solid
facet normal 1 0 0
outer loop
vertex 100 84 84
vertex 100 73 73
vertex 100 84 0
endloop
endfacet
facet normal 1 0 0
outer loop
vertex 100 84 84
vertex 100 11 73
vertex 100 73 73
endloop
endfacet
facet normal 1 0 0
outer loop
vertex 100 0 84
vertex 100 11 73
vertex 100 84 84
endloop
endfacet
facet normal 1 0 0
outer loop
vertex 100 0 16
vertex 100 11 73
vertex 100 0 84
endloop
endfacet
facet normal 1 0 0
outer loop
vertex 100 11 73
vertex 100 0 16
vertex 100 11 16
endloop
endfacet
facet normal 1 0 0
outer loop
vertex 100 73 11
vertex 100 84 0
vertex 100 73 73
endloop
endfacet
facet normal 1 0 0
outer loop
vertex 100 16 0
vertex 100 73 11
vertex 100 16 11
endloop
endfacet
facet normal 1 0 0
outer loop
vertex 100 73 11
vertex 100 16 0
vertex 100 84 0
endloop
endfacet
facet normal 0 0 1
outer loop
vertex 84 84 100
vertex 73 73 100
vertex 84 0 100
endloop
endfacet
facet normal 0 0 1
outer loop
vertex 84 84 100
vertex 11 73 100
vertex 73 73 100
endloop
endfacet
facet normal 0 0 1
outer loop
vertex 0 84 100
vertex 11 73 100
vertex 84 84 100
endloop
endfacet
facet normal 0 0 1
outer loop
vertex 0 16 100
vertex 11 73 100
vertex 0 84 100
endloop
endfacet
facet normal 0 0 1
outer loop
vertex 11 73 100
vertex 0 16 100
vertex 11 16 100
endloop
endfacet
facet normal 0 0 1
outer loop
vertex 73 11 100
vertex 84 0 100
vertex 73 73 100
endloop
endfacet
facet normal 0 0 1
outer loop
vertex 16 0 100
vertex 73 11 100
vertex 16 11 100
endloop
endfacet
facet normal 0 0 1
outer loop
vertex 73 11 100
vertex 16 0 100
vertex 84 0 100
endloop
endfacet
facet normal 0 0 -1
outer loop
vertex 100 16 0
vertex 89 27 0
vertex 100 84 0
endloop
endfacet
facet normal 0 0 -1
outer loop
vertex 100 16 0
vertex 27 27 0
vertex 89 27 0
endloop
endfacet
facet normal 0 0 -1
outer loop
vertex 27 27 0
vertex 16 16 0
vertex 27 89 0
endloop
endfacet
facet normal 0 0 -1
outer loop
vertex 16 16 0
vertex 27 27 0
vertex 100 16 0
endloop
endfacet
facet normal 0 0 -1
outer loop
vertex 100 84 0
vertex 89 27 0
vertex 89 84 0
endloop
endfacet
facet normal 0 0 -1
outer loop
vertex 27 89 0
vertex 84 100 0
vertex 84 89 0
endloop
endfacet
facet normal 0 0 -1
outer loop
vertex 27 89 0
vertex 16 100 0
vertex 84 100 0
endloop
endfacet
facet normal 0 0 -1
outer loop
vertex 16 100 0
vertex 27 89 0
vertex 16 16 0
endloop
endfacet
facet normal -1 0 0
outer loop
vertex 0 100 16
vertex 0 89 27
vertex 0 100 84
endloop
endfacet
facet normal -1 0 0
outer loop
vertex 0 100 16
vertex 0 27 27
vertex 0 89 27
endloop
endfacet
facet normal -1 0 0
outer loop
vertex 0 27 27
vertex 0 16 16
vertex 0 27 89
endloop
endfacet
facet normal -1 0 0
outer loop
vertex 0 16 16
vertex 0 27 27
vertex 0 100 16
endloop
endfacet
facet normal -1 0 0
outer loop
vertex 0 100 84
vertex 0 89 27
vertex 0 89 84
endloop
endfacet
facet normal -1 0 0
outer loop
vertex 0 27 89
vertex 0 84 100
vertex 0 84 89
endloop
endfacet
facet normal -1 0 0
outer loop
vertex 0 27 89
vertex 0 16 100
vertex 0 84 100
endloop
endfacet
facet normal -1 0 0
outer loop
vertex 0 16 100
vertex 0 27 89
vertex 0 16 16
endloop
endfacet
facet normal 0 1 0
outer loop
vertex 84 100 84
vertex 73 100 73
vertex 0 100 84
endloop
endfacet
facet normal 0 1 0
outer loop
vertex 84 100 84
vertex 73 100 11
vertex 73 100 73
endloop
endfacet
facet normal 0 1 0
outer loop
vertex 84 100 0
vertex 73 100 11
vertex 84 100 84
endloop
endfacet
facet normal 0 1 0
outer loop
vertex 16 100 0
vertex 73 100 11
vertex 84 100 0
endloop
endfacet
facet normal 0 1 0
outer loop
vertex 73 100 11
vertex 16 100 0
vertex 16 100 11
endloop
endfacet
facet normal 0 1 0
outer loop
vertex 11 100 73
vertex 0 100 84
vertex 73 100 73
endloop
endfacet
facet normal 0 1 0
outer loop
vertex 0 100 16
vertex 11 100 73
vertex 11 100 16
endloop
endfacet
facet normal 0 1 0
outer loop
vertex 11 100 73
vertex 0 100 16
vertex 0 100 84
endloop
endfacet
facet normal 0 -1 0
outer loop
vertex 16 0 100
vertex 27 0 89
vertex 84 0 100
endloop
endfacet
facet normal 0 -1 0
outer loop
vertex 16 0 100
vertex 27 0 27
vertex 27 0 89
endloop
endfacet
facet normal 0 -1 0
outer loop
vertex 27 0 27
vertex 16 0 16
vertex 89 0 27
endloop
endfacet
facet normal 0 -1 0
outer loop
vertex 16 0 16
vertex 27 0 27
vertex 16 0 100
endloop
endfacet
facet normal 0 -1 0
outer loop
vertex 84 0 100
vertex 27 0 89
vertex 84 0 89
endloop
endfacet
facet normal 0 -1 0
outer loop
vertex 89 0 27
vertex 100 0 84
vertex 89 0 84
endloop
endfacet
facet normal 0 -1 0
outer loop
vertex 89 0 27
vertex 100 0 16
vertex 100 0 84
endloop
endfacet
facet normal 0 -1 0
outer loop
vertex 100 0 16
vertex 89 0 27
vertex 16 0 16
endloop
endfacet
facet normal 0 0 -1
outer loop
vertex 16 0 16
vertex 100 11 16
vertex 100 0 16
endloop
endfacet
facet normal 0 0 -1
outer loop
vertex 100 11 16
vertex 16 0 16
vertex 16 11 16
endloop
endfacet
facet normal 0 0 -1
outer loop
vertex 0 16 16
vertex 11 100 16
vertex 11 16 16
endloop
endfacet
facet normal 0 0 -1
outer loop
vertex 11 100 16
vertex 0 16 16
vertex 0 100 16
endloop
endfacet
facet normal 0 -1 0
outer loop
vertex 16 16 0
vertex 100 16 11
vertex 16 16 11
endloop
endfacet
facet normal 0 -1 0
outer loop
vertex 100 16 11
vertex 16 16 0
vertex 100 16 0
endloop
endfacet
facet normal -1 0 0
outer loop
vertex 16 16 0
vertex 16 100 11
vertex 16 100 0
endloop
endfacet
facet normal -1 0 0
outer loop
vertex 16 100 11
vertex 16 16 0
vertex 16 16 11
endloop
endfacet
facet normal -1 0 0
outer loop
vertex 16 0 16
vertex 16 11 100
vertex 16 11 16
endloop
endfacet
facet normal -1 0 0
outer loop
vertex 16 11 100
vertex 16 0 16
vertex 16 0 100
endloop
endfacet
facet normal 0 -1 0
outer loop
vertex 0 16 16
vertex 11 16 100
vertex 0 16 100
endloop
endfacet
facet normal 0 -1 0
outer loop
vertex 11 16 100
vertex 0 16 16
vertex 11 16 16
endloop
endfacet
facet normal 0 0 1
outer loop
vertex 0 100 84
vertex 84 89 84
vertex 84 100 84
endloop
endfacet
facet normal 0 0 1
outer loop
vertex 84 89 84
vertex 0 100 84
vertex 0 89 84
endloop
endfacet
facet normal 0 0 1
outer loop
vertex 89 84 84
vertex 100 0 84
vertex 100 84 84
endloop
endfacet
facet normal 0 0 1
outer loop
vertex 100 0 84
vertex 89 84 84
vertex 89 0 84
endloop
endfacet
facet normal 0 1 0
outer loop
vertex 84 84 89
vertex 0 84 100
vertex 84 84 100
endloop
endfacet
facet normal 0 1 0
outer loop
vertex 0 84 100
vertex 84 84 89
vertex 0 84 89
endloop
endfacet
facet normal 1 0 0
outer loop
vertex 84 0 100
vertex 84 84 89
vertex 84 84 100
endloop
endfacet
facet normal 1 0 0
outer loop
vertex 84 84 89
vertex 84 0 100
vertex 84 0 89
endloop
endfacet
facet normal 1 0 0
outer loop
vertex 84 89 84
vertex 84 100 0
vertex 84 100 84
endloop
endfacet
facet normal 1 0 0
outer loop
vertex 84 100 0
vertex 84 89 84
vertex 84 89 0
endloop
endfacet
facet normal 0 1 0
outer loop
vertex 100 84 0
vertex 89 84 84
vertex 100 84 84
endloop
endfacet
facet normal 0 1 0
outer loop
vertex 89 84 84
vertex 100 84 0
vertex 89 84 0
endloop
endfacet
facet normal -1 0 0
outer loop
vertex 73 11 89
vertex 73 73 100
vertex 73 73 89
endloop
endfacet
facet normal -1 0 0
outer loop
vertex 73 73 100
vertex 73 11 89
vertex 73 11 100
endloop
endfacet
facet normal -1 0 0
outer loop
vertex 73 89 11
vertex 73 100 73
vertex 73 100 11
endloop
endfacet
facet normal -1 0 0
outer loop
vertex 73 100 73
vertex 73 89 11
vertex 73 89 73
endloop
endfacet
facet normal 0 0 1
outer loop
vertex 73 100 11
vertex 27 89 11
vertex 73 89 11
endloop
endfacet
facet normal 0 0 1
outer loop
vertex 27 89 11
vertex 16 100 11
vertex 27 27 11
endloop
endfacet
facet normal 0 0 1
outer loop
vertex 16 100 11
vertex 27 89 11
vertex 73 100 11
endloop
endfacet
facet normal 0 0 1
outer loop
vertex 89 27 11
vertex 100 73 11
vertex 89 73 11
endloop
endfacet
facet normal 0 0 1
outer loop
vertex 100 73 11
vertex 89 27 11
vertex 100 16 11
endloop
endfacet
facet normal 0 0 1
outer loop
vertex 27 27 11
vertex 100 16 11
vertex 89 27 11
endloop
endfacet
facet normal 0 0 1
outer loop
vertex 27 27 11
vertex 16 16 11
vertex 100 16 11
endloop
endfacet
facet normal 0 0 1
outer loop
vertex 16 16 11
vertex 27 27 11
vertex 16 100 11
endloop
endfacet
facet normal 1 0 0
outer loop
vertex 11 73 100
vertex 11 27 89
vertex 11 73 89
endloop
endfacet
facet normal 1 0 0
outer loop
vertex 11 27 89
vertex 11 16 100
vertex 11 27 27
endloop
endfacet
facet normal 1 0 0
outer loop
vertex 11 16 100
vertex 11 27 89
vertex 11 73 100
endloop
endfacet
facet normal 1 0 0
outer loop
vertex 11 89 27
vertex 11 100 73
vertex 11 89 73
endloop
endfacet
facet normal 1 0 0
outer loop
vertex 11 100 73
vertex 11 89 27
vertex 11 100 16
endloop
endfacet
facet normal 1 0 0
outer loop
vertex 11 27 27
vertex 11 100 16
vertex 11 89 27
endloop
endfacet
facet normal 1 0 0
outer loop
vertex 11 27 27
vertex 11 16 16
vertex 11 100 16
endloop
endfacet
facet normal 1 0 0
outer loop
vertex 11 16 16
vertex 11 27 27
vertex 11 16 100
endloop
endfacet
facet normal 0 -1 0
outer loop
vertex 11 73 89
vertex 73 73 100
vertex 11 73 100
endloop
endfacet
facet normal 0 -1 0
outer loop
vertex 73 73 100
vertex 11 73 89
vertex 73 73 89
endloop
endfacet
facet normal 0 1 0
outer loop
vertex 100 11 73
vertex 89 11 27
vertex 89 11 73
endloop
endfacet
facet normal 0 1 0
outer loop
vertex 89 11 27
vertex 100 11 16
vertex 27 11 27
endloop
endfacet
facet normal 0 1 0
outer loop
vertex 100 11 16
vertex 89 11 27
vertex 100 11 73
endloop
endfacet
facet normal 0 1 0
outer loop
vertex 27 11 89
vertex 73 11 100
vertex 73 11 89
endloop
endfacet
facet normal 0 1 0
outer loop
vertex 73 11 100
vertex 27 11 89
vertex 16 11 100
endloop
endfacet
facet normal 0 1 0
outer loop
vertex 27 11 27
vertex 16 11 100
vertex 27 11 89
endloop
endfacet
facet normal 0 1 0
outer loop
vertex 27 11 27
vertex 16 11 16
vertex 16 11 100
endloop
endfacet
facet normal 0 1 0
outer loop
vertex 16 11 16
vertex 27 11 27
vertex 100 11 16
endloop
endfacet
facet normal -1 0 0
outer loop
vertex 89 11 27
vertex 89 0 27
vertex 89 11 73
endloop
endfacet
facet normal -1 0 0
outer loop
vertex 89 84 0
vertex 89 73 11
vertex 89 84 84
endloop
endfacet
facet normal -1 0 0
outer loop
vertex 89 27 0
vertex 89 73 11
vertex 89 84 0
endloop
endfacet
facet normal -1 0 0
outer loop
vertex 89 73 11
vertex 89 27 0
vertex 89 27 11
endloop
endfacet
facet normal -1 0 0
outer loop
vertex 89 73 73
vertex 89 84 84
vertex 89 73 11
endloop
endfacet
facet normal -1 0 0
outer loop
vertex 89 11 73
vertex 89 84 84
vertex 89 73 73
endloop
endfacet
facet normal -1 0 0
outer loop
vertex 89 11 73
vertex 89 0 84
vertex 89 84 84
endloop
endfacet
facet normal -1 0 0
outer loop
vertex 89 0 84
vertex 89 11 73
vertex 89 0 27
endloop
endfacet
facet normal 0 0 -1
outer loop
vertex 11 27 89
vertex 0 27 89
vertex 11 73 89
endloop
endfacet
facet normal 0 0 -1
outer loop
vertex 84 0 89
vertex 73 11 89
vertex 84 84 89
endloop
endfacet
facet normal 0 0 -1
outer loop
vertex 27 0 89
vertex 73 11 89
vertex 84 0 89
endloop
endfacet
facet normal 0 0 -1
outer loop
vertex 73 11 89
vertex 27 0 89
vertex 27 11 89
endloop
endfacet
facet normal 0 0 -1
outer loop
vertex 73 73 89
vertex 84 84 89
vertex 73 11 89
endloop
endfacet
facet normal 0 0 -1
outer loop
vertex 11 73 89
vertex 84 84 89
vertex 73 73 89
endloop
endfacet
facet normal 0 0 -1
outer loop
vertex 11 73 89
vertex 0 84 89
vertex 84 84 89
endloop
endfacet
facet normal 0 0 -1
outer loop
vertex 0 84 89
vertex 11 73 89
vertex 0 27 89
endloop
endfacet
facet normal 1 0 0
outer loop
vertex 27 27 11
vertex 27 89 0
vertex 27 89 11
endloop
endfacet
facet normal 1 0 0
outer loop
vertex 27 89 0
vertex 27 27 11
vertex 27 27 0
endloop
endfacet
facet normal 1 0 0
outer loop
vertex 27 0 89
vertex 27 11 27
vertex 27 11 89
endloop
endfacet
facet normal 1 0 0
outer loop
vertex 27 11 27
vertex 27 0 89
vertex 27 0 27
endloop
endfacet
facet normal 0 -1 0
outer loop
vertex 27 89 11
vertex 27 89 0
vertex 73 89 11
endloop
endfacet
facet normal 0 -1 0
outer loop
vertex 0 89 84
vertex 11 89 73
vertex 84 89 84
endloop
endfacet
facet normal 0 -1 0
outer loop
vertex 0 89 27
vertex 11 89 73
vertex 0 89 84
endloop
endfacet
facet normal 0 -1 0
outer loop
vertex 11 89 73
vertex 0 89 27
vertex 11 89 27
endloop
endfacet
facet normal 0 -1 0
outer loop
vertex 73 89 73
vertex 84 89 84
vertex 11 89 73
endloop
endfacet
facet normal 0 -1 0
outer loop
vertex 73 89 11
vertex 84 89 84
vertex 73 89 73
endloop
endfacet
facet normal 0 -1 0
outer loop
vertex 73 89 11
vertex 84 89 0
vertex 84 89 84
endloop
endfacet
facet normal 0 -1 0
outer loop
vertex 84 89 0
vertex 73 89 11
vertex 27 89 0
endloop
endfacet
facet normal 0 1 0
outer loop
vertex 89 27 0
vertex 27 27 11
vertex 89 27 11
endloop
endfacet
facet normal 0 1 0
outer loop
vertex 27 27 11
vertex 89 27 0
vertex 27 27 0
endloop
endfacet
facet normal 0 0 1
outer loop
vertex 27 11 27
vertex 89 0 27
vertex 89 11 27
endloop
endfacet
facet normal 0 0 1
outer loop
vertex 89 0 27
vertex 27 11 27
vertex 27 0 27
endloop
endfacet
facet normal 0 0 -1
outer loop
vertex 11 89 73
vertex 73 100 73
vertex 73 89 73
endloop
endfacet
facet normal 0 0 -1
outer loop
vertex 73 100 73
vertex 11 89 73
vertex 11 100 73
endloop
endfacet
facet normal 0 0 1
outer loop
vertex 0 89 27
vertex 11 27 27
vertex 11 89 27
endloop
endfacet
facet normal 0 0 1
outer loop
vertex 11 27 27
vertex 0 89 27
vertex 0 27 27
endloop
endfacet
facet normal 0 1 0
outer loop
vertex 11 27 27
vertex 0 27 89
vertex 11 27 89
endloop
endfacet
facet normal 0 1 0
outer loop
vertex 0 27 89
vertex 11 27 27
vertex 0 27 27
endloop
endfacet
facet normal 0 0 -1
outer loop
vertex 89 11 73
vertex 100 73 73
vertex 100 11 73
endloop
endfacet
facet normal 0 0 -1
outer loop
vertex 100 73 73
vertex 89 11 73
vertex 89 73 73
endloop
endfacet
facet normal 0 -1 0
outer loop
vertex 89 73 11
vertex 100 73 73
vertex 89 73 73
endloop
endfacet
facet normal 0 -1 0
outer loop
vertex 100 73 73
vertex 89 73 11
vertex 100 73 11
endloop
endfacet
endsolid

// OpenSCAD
// Cube overall size (mm)
cube_size = 100;
// Thickness of the 'frame' (mm)
frame_thickness = 11;
// Size of the gap between frame segments (mm)
gap_size = 5;
// Rotate up to one corner?
rotate_on_edge = 0;    //[0:No,1:Yes]

cubeL = cube_size;
frameT = max(1,frame_thickness);
gapL = max(0,gap_size);
edgeT = frameT+gapL;
rotateOnEdge = rotate_on_edge;


module infinityCube() {
    difference() {
        // main cube
        cube([cubeL,cubeL,cubeL]);
        // sub-cube cutaway dimension
        subCubeL = cubeL-2*frameT-edgeT;
        // edge cutaways
        translate([-1,-1,-1]) cube([cubeL+2,edgeT+1,edgeT+1]);
        translate([-1,-1,-1]) cube([edgeT+1,cubeL+2,edgeT+1]);
        translate([-1,-1,-1]) cube([edgeT+1,edgeT+1,cubeL+2]);
        //
        translate([-1,cubeL-edgeT,cubeL-edgeT]) cube([cubeL+2,edgeT+1,edgeT+1]);
        translate([cubeL-edgeT,-1,cubeL-edgeT]) cube([edgeT+1,cubeL+2,edgeT+1]);
        translate([cubeL-edgeT,cubeL-edgeT,-1]) cube([edgeT+1,edgeT+1,cubeL+2]);
        // bulk cutaway
        translate([frameT,frameT,frameT]) cube([subCubeL,subCubeL,cubeL+1]);
        translate([frameT+edgeT,frameT+edgeT,-1]) cube([subCubeL,subCubeL,cubeL+1-frameT]);
        //
        translate([edgeT+frameT,-1,edgeT+frameT]) cube([subCubeL,cubeL+1-frameT,subCubeL]);
        translate([frameT,frameT,frameT]) cube([subCubeL,cubeL+1-frameT,subCubeL]);
        //
        translate([-1,frameT+edgeT,frameT+edgeT]) cube([cubeL+1-frameT,subCubeL,subCubeL]);
        translate([frameT,frameT,frameT]) cube([cubeL+1-frameT,subCubeL,subCubeL]);
    }
}


if (rotateOnEdge==1) {
translate([0,0,-sqrt(2)*sin(atan(2/sqrt(2)))*edgeT]) rotate([atan(2/sqrt(2)),0,0]) rotate([0,0,45]) infinityCube();
}
else {
    infinityCube();
}
